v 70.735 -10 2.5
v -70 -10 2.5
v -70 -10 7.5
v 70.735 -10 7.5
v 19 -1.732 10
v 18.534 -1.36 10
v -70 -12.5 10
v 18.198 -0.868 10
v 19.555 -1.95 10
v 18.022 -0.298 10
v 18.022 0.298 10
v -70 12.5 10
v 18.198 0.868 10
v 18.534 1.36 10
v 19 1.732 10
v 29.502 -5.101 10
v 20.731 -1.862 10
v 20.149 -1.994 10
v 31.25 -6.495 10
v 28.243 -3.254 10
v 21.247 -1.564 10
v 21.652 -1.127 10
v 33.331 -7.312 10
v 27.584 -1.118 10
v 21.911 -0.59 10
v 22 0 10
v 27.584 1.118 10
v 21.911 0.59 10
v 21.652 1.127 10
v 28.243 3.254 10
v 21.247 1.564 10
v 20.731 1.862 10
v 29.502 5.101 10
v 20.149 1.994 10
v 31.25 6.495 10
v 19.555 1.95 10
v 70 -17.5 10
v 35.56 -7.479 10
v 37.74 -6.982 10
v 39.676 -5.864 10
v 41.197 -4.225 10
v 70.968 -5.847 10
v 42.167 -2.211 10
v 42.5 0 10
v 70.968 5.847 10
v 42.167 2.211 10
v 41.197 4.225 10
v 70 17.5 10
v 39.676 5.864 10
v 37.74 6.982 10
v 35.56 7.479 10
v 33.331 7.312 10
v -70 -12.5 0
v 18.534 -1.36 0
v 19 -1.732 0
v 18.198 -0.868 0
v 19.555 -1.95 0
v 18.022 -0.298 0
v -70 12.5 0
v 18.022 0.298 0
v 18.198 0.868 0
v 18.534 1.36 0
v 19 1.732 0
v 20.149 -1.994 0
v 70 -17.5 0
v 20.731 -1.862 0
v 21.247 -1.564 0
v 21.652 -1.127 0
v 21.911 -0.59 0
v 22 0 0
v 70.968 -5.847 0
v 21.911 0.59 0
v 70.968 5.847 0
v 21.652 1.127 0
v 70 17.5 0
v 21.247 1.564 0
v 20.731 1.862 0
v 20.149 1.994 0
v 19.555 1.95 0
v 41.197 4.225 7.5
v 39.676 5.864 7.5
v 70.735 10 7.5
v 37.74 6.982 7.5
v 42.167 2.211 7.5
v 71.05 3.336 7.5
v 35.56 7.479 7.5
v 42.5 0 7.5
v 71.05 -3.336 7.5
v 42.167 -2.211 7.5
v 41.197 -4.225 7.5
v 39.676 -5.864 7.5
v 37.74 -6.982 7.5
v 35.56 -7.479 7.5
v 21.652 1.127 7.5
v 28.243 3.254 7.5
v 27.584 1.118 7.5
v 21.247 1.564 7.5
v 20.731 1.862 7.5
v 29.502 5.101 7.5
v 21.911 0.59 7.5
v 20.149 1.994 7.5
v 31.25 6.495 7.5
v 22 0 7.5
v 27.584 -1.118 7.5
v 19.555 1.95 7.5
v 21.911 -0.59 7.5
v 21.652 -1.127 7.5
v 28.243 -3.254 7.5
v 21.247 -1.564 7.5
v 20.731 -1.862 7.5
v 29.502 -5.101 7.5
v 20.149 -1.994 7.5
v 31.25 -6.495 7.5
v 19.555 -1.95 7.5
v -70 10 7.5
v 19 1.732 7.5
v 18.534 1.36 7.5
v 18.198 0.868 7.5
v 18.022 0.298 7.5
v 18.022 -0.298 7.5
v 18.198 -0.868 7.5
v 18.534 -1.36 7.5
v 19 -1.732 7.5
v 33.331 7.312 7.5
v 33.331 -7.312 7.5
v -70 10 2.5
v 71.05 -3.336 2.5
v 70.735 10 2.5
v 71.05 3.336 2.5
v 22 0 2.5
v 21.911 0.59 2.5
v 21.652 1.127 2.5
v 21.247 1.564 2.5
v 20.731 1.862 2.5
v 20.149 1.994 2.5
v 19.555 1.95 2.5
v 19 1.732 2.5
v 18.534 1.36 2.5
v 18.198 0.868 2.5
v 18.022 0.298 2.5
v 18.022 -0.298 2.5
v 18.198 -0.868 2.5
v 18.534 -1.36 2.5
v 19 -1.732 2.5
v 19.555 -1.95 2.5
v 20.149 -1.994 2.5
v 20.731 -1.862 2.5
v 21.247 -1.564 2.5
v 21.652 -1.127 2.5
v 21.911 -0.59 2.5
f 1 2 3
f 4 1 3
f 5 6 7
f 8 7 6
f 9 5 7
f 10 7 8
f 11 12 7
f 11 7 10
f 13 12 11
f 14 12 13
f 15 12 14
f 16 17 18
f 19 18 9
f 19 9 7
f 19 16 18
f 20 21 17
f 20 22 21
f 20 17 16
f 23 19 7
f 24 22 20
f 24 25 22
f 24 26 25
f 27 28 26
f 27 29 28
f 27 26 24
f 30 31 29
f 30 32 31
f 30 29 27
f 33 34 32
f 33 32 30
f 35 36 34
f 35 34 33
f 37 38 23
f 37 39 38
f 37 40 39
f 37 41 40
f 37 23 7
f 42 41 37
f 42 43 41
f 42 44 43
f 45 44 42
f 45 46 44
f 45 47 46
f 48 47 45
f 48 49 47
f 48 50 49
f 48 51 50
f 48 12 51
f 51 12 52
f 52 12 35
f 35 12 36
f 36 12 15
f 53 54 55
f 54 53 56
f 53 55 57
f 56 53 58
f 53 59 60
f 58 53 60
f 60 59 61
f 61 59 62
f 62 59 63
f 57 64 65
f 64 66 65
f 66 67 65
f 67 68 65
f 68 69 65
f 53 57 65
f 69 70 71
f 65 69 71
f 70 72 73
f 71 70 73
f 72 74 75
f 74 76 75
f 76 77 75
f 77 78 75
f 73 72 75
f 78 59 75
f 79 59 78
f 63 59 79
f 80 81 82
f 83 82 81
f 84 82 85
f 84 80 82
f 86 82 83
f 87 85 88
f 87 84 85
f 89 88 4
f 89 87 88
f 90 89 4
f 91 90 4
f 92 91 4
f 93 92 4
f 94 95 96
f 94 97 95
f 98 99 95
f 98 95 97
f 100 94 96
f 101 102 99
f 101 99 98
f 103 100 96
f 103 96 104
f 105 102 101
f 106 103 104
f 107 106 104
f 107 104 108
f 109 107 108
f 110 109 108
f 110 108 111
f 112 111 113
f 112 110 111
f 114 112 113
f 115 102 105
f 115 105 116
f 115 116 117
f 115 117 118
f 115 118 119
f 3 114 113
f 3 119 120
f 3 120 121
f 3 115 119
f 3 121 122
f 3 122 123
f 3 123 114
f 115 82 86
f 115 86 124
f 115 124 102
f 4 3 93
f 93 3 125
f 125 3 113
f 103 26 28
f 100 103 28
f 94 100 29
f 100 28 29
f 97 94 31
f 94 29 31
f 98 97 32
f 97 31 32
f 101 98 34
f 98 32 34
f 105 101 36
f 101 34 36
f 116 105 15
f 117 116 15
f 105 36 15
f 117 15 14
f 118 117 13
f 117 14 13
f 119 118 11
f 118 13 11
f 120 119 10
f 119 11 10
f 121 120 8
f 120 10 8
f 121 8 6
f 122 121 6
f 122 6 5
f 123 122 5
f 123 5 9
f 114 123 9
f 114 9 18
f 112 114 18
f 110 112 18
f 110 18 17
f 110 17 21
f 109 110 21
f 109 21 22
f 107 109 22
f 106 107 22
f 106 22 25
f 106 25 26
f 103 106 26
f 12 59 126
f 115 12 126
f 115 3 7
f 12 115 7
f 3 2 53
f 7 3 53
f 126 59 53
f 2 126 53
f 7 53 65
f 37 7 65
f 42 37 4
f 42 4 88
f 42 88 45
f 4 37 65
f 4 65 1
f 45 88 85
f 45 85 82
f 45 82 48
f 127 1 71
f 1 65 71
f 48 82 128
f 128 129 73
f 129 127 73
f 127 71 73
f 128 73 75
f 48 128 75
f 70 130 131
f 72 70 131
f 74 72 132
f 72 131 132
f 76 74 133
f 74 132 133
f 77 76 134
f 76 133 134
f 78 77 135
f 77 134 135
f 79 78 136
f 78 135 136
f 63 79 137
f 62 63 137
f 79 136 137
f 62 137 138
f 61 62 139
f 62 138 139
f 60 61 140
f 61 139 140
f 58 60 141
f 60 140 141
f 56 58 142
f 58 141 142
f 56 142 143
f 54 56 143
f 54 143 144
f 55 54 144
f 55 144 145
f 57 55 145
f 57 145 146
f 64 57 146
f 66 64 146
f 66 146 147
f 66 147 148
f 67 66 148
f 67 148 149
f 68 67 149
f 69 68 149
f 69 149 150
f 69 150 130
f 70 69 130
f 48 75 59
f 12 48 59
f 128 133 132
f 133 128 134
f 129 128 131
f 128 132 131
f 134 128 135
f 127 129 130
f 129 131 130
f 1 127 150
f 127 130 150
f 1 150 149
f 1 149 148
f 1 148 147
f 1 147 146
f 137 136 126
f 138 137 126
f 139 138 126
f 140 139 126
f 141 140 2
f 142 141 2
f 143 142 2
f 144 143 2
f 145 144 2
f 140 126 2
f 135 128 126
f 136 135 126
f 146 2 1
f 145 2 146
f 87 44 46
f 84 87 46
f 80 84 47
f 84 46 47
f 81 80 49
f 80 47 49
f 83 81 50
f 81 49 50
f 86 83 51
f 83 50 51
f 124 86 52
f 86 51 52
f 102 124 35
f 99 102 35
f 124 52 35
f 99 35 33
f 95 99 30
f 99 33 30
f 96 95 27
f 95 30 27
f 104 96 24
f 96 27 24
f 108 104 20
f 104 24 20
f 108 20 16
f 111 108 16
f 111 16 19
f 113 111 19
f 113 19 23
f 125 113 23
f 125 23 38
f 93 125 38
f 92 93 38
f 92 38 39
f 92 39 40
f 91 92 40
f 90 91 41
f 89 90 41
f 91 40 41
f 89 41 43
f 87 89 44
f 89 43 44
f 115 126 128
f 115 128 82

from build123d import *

# Parameters (mm, degrees)
F0_R     = 7.5
F1_DEPTH = 10
F2_W     = 20
F2_H     = 5
F3_DEPTH = 200
F4_R     = 7.5
F5_DEPTH = 2.5
F6_R     = 2
F7_DEPTH = 10


with BuildPart() as f1:
    # F0 (on Top) → F1 (new body)
    with BuildSketch(Plane.XY):
        with BuildLine():
            Line((70, 17.5), (-70, 12.5))
            Line((-70, 12.5), (-70, -12.5))
            Line((-70, -12.5), (70, -17.5))
            ThreePointArc((70, -17.5), (71.089511, 0), (70, 17.5))
        make_face()
        with Locations((35, 0)):
            Circle(F0_R, mode=Mode.SUBTRACT)
        with Locations((35, 0)):
            Circle(F0_R)
    extrude(amount=F1_DEPTH)

    # F2 (on face) → F3 (cut)
    with BuildSketch(Plane(origin=(-70, 0, 0), x_dir=(0, -1, 0), z_dir=(-1, 0, 0))):
        with Locations((0, 5)):
            Rectangle(F2_W, F2_H)
    extrude(amount=-F3_DEPTH, mode=Mode.SUBTRACT)

    # F4 (on face) → F5 (cut)
    with BuildSketch(Plane.XY.offset(10)):
        with Locations((35, 0)):
            Circle(F4_R)
    extrude(amount=-F5_DEPTH, mode=Mode.SUBTRACT)

    # F6 (on face) → F7 (cut)
    with BuildSketch(Plane.XY.offset(10)):
        with Locations((20, 0)):
            Circle(F6_R)
    extrude(amount=-F7_DEPTH, mode=Mode.SUBTRACT)


solid = f1.part
